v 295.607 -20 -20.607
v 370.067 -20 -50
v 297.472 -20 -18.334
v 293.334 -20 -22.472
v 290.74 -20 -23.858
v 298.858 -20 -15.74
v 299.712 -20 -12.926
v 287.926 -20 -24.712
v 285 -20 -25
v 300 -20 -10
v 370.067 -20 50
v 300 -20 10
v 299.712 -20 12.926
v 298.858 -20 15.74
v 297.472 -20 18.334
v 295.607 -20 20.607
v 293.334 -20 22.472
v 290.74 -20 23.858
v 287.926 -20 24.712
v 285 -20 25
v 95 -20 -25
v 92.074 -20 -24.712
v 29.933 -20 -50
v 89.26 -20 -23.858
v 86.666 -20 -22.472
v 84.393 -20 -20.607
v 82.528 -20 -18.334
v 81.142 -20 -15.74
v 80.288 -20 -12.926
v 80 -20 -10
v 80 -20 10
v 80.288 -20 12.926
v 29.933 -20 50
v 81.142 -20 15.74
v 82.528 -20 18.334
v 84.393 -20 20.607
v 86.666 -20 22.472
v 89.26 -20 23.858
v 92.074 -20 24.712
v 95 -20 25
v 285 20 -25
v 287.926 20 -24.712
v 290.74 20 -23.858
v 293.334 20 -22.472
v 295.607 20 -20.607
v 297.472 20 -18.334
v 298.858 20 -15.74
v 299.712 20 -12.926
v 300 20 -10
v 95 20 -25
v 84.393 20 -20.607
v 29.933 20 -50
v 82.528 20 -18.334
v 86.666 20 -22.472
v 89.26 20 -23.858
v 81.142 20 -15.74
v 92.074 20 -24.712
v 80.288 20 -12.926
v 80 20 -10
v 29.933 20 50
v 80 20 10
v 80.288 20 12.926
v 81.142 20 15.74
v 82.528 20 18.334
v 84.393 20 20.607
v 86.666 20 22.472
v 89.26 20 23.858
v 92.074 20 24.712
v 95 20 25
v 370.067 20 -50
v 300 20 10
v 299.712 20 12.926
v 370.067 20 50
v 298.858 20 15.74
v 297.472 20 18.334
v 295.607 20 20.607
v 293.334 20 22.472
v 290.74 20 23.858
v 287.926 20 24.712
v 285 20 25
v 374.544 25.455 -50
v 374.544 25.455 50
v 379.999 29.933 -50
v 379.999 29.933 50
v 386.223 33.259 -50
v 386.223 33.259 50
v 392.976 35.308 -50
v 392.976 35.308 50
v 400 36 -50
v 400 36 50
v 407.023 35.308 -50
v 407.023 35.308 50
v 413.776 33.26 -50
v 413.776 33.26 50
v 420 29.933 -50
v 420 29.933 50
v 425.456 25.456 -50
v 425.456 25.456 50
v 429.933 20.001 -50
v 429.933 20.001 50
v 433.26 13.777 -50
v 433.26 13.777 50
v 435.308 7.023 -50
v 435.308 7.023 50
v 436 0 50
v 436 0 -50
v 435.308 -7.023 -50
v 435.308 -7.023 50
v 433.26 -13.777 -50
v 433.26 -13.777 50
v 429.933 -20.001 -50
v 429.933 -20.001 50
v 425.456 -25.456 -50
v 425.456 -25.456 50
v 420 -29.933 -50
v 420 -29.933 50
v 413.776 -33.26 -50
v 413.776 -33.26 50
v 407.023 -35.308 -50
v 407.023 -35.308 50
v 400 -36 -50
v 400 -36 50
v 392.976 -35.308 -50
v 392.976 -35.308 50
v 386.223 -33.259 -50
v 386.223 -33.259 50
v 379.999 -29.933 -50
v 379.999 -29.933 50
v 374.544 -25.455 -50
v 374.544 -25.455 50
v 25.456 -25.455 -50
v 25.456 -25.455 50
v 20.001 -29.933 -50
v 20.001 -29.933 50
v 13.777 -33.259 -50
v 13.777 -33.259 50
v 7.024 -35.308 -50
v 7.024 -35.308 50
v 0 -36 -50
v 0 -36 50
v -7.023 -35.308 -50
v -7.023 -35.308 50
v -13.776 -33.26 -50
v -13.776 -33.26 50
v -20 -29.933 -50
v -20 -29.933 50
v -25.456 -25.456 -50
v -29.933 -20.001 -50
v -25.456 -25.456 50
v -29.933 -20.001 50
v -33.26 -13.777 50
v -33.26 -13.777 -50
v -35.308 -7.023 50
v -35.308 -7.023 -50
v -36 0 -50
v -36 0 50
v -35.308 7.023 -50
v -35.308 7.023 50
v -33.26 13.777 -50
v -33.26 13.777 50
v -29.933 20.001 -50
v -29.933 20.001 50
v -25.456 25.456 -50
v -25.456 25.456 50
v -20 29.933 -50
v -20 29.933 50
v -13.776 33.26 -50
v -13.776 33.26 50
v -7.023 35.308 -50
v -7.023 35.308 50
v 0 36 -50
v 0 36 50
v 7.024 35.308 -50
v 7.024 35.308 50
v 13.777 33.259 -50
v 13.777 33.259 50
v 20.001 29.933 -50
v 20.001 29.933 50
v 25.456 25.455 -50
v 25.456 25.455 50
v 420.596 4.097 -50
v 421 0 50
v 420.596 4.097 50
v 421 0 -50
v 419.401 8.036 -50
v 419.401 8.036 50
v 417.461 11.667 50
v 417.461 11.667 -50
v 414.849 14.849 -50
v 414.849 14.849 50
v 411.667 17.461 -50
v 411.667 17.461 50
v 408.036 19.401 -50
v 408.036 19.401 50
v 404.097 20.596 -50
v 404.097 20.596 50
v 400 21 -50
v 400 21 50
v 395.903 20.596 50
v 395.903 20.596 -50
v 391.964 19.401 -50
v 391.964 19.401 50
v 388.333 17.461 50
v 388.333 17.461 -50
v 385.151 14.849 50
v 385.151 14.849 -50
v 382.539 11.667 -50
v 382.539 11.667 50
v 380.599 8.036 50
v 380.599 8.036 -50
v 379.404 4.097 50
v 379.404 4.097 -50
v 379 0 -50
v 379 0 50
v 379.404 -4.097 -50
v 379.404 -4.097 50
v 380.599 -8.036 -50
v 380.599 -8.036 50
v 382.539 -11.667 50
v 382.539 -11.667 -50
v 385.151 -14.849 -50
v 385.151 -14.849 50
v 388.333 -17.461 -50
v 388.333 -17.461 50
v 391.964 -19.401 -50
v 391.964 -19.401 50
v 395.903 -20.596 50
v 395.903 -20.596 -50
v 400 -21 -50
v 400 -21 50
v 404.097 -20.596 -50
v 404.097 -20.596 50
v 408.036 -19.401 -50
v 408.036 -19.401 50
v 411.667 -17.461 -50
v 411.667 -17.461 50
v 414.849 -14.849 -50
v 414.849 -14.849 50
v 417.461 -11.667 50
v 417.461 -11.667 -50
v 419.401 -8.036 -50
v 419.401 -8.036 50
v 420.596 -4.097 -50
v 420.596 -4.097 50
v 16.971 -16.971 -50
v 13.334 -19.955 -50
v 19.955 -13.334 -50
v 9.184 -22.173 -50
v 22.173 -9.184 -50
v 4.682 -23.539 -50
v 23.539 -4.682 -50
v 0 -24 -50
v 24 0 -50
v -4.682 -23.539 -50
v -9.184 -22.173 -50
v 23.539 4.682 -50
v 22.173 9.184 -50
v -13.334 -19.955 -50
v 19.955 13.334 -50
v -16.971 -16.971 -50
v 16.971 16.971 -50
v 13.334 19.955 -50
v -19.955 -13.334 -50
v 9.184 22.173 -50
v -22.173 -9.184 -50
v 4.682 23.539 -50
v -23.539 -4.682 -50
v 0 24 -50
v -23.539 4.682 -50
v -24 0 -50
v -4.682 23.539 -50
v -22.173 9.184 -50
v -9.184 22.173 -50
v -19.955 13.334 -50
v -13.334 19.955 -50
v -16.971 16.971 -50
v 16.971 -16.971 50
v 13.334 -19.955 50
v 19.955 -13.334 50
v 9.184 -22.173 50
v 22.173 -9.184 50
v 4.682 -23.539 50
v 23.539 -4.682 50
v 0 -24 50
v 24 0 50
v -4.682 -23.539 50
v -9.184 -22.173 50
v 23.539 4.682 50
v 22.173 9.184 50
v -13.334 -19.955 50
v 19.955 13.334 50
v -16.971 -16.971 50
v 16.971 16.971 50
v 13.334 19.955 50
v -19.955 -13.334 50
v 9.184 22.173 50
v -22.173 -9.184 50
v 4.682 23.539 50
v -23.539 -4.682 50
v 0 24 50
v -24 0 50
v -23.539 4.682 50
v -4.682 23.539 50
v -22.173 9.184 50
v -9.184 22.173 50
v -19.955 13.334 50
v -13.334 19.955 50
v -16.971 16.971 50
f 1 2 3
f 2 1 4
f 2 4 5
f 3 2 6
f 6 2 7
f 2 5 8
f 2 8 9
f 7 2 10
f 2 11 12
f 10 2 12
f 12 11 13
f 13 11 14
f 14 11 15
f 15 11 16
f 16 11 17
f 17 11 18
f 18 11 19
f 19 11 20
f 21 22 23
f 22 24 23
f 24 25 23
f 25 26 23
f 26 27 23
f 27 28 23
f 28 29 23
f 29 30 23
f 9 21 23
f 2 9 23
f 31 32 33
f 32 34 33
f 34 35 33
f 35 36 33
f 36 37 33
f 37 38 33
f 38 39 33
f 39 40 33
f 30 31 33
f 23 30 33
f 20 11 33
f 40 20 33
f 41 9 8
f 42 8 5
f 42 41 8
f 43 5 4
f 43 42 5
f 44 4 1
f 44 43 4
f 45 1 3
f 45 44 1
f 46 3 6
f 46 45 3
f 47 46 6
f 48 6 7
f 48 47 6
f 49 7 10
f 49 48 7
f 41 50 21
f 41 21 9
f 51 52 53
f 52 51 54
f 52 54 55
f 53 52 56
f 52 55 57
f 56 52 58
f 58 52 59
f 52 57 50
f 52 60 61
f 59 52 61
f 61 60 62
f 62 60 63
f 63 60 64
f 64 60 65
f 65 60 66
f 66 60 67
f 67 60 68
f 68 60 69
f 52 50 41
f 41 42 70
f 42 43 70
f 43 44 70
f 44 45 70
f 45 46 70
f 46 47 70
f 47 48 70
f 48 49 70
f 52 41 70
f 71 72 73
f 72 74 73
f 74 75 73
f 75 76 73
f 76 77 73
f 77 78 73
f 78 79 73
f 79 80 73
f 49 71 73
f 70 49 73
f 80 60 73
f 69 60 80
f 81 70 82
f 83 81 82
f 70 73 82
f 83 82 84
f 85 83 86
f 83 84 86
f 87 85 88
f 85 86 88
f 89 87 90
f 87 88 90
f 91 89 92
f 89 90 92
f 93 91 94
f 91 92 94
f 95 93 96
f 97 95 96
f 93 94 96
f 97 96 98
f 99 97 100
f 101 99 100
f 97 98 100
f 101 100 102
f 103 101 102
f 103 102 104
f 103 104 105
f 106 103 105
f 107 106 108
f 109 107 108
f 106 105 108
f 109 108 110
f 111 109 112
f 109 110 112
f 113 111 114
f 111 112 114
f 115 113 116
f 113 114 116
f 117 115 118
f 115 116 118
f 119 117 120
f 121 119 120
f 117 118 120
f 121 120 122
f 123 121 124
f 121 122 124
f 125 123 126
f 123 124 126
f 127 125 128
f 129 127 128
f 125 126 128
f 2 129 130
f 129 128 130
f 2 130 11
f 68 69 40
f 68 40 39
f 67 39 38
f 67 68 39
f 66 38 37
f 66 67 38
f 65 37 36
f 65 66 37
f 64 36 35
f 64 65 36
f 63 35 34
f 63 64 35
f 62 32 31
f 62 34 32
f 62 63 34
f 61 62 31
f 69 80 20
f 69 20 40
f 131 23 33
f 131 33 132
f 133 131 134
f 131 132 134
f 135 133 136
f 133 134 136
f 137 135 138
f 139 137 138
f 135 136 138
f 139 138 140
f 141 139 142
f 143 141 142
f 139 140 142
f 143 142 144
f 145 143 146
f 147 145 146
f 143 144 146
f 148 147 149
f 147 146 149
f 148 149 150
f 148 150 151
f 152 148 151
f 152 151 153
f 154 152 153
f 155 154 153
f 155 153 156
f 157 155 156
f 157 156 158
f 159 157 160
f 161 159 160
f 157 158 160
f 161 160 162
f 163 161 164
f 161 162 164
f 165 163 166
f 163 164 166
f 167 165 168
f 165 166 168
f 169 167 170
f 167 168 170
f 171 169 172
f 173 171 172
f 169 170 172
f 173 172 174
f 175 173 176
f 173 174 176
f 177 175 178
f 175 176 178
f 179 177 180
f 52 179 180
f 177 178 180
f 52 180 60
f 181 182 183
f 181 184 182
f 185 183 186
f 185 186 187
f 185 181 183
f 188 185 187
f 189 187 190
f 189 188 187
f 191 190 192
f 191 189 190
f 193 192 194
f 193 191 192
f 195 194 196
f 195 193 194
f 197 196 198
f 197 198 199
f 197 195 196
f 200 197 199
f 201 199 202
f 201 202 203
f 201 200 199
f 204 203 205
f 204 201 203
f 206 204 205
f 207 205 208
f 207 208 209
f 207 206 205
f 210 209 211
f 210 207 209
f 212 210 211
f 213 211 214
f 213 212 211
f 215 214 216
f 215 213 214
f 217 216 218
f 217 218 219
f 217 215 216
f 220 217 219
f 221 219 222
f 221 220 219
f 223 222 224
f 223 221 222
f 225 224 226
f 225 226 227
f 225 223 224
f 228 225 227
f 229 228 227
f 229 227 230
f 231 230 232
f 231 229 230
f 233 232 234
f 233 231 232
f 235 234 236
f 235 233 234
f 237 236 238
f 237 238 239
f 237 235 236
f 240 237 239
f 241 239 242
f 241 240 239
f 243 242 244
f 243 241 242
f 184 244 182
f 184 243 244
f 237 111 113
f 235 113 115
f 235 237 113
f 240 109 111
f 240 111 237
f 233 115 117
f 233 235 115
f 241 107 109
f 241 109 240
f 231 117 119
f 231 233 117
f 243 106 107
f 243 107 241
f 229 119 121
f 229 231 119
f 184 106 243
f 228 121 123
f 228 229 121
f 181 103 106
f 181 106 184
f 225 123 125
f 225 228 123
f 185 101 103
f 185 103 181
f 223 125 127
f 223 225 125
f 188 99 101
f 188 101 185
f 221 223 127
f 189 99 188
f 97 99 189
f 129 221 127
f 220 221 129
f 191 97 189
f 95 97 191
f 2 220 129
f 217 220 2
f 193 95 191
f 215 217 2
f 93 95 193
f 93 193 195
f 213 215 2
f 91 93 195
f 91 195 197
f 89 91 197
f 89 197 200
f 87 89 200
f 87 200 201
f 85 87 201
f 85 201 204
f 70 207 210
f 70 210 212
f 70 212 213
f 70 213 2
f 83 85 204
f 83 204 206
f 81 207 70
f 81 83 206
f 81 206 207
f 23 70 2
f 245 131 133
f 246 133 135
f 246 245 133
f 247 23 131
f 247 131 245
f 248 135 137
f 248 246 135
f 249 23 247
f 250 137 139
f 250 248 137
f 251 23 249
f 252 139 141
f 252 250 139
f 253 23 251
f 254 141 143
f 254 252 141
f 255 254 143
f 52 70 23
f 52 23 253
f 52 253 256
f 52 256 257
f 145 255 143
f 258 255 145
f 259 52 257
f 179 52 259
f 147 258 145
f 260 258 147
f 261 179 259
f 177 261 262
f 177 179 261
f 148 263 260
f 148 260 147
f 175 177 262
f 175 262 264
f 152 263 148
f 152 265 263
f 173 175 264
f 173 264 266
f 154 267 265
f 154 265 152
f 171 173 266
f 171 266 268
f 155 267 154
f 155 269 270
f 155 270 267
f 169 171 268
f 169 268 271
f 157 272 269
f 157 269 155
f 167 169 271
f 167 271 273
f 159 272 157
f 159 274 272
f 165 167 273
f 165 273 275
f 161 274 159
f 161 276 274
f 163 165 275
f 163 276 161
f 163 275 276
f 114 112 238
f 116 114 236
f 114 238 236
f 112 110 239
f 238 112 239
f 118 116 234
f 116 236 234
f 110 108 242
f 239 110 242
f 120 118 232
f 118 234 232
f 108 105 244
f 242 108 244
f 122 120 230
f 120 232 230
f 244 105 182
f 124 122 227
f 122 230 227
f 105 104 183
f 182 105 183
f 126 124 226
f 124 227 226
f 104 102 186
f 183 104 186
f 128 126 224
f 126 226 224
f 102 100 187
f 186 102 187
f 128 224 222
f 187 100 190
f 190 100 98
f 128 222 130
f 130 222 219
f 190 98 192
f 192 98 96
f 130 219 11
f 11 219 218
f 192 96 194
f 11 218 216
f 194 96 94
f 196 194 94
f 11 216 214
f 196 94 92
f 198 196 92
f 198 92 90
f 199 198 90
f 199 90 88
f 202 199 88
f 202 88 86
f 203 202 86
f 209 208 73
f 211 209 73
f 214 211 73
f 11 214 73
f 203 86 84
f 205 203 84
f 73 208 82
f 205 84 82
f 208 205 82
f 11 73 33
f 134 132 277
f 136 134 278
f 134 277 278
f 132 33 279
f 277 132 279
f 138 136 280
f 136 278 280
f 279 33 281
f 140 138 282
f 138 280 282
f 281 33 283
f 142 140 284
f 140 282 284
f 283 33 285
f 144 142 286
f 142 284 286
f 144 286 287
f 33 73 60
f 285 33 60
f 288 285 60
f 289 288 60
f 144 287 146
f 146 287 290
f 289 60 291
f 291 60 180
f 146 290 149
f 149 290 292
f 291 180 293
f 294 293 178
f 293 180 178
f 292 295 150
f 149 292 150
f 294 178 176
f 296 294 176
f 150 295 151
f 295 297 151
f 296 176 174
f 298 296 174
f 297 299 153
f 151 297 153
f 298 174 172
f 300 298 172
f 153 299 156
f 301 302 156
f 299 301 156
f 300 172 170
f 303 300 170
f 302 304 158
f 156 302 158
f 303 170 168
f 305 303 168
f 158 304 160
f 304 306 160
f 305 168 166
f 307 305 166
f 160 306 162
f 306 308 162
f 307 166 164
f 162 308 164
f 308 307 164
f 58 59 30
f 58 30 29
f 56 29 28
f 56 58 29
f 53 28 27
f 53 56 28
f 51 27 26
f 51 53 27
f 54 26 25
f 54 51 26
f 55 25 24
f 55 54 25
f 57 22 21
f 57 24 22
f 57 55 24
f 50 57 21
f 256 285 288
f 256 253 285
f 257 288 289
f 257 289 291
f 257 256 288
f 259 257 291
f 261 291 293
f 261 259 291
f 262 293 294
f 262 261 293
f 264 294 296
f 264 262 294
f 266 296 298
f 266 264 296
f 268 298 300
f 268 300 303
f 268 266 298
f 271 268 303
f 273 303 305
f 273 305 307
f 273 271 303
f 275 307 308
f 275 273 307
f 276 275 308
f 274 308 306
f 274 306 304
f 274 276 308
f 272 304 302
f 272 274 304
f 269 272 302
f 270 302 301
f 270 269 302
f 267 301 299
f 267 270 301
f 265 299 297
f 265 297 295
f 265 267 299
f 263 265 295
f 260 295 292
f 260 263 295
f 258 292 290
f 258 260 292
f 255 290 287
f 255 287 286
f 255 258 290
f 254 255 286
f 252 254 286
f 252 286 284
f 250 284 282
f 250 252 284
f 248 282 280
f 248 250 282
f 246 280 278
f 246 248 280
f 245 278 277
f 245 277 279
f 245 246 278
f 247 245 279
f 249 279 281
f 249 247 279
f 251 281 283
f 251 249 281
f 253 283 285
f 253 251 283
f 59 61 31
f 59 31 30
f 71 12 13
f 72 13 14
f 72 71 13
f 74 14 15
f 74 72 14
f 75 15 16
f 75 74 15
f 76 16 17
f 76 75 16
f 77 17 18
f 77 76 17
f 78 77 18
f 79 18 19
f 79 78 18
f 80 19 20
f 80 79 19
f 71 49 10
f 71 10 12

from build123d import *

# Parameters (mm, degrees)
SKETCH2_R           = 24
SKETCH2_R_2         = 21
BOSS_EXTRUDE1_DEPTH = 50
CUT_EXTRUDE1_DEPTH  = 57


with BuildPart() as part:
    # Sketch2 → Boss-Extrude1 (new body, symmetric)
    with BuildSketch(Plane.XY):
        with BuildLine():
            Line((29.933259094, 20), (370.066740906, 20))
            ThreePointArc((370.066740906, 20), (436, 0), (370.066740906, -20))
            Line((370.066740906, -20), (29.933259094, -20))
            ThreePointArc((29.933259094, -20), (-36, 0), (29.933259094, 20))
        make_face()
        Circle(SKETCH2_R, mode=Mode.SUBTRACT)
        with Locations((400, 0)):
            Circle(SKETCH2_R_2, mode=Mode.SUBTRACT)
    extrude(amount=BOSS_EXTRUDE1_DEPTH, both=True)

    # Sketch3 → Cut-Extrude1 (cut, through all)
    with BuildSketch(Plane(origin=(0, 20, 0), x_dir=(1, 0, 0), z_dir=(0, 1, 0))):
        with BuildLine():
            Line((95, 25), (285, 25))
            ThreePointArc((285, 25), (295.606601718, 20.606601718), (300, 10))
            Line((300, 10), (300, -10))
            ThreePointArc((300, -10), (295.606601718, -20.606601718), (285, -25))
            Line((285, -25), (95, -25))
            ThreePointArc((95, -25), (84.393398282, -20.606601718), (80, -10))
            Line((80, -10), (80, 10))
            ThreePointArc((80, 10), (84.393398282, 20.606601718), (95, 25))
        make_face()
    extrude(amount=-CUT_EXTRUDE1_DEPTH, mode=Mode.SUBTRACT)


solid = part.part
